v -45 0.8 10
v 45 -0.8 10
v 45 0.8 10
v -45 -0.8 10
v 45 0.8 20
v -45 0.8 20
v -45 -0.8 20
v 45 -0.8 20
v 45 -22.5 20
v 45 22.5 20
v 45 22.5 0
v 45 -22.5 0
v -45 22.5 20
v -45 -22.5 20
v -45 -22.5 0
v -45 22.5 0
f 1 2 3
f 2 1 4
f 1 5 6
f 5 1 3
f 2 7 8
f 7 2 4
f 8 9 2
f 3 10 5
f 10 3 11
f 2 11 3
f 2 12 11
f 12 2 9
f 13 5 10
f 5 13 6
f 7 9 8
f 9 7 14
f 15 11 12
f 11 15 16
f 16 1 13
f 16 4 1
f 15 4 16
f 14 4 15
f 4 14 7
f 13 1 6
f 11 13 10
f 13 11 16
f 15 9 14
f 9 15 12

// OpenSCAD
// Microscope slide drying rack
// Print orientation: base block on the bed (z = 0), slots open upward (+Z)

// ---------------- Parameters ----------------
block_len    = 90;    // base block length along X (mm)
block_wid    = 45;    // base block width along Y (mm)
block_ht     = 20;    // base block height along Z (mm)

slot_count   = 10;    // number of slide slots
slot_len     = 77;    // slot length along X (mm)
slot_wid     = 1.6;   // slot width along Y (mm)
slot_depth   = 10;    // slot depth into block from top face (mm)
slot_pitch   = 3.5;   // centre-to-centre slot spacing along Y (mm)

eps          = 0.5;   // overshoot of cutters past the top face (mm)

$fn = 64;

// ---------------- Model ----------------
difference() {
    // Base block, centred in X and Y, sitting on z = 0
    translate([-block_len / 2, -block_wid / 2, 0])
        cube([block_len, block_wid, block_ht]);

    // Parallel slots, centred as a group in X and Y
    for (i = [0 : slot_count - 1]) {
        x = (i - (slot_count - 1) / 2) * slot_pitch;
        translate([x - slot_len / 2, -slot_wid / 2, block_ht - slot_depth])
            cube([slot_len, slot_wid, slot_depth + eps]);
    }
}
